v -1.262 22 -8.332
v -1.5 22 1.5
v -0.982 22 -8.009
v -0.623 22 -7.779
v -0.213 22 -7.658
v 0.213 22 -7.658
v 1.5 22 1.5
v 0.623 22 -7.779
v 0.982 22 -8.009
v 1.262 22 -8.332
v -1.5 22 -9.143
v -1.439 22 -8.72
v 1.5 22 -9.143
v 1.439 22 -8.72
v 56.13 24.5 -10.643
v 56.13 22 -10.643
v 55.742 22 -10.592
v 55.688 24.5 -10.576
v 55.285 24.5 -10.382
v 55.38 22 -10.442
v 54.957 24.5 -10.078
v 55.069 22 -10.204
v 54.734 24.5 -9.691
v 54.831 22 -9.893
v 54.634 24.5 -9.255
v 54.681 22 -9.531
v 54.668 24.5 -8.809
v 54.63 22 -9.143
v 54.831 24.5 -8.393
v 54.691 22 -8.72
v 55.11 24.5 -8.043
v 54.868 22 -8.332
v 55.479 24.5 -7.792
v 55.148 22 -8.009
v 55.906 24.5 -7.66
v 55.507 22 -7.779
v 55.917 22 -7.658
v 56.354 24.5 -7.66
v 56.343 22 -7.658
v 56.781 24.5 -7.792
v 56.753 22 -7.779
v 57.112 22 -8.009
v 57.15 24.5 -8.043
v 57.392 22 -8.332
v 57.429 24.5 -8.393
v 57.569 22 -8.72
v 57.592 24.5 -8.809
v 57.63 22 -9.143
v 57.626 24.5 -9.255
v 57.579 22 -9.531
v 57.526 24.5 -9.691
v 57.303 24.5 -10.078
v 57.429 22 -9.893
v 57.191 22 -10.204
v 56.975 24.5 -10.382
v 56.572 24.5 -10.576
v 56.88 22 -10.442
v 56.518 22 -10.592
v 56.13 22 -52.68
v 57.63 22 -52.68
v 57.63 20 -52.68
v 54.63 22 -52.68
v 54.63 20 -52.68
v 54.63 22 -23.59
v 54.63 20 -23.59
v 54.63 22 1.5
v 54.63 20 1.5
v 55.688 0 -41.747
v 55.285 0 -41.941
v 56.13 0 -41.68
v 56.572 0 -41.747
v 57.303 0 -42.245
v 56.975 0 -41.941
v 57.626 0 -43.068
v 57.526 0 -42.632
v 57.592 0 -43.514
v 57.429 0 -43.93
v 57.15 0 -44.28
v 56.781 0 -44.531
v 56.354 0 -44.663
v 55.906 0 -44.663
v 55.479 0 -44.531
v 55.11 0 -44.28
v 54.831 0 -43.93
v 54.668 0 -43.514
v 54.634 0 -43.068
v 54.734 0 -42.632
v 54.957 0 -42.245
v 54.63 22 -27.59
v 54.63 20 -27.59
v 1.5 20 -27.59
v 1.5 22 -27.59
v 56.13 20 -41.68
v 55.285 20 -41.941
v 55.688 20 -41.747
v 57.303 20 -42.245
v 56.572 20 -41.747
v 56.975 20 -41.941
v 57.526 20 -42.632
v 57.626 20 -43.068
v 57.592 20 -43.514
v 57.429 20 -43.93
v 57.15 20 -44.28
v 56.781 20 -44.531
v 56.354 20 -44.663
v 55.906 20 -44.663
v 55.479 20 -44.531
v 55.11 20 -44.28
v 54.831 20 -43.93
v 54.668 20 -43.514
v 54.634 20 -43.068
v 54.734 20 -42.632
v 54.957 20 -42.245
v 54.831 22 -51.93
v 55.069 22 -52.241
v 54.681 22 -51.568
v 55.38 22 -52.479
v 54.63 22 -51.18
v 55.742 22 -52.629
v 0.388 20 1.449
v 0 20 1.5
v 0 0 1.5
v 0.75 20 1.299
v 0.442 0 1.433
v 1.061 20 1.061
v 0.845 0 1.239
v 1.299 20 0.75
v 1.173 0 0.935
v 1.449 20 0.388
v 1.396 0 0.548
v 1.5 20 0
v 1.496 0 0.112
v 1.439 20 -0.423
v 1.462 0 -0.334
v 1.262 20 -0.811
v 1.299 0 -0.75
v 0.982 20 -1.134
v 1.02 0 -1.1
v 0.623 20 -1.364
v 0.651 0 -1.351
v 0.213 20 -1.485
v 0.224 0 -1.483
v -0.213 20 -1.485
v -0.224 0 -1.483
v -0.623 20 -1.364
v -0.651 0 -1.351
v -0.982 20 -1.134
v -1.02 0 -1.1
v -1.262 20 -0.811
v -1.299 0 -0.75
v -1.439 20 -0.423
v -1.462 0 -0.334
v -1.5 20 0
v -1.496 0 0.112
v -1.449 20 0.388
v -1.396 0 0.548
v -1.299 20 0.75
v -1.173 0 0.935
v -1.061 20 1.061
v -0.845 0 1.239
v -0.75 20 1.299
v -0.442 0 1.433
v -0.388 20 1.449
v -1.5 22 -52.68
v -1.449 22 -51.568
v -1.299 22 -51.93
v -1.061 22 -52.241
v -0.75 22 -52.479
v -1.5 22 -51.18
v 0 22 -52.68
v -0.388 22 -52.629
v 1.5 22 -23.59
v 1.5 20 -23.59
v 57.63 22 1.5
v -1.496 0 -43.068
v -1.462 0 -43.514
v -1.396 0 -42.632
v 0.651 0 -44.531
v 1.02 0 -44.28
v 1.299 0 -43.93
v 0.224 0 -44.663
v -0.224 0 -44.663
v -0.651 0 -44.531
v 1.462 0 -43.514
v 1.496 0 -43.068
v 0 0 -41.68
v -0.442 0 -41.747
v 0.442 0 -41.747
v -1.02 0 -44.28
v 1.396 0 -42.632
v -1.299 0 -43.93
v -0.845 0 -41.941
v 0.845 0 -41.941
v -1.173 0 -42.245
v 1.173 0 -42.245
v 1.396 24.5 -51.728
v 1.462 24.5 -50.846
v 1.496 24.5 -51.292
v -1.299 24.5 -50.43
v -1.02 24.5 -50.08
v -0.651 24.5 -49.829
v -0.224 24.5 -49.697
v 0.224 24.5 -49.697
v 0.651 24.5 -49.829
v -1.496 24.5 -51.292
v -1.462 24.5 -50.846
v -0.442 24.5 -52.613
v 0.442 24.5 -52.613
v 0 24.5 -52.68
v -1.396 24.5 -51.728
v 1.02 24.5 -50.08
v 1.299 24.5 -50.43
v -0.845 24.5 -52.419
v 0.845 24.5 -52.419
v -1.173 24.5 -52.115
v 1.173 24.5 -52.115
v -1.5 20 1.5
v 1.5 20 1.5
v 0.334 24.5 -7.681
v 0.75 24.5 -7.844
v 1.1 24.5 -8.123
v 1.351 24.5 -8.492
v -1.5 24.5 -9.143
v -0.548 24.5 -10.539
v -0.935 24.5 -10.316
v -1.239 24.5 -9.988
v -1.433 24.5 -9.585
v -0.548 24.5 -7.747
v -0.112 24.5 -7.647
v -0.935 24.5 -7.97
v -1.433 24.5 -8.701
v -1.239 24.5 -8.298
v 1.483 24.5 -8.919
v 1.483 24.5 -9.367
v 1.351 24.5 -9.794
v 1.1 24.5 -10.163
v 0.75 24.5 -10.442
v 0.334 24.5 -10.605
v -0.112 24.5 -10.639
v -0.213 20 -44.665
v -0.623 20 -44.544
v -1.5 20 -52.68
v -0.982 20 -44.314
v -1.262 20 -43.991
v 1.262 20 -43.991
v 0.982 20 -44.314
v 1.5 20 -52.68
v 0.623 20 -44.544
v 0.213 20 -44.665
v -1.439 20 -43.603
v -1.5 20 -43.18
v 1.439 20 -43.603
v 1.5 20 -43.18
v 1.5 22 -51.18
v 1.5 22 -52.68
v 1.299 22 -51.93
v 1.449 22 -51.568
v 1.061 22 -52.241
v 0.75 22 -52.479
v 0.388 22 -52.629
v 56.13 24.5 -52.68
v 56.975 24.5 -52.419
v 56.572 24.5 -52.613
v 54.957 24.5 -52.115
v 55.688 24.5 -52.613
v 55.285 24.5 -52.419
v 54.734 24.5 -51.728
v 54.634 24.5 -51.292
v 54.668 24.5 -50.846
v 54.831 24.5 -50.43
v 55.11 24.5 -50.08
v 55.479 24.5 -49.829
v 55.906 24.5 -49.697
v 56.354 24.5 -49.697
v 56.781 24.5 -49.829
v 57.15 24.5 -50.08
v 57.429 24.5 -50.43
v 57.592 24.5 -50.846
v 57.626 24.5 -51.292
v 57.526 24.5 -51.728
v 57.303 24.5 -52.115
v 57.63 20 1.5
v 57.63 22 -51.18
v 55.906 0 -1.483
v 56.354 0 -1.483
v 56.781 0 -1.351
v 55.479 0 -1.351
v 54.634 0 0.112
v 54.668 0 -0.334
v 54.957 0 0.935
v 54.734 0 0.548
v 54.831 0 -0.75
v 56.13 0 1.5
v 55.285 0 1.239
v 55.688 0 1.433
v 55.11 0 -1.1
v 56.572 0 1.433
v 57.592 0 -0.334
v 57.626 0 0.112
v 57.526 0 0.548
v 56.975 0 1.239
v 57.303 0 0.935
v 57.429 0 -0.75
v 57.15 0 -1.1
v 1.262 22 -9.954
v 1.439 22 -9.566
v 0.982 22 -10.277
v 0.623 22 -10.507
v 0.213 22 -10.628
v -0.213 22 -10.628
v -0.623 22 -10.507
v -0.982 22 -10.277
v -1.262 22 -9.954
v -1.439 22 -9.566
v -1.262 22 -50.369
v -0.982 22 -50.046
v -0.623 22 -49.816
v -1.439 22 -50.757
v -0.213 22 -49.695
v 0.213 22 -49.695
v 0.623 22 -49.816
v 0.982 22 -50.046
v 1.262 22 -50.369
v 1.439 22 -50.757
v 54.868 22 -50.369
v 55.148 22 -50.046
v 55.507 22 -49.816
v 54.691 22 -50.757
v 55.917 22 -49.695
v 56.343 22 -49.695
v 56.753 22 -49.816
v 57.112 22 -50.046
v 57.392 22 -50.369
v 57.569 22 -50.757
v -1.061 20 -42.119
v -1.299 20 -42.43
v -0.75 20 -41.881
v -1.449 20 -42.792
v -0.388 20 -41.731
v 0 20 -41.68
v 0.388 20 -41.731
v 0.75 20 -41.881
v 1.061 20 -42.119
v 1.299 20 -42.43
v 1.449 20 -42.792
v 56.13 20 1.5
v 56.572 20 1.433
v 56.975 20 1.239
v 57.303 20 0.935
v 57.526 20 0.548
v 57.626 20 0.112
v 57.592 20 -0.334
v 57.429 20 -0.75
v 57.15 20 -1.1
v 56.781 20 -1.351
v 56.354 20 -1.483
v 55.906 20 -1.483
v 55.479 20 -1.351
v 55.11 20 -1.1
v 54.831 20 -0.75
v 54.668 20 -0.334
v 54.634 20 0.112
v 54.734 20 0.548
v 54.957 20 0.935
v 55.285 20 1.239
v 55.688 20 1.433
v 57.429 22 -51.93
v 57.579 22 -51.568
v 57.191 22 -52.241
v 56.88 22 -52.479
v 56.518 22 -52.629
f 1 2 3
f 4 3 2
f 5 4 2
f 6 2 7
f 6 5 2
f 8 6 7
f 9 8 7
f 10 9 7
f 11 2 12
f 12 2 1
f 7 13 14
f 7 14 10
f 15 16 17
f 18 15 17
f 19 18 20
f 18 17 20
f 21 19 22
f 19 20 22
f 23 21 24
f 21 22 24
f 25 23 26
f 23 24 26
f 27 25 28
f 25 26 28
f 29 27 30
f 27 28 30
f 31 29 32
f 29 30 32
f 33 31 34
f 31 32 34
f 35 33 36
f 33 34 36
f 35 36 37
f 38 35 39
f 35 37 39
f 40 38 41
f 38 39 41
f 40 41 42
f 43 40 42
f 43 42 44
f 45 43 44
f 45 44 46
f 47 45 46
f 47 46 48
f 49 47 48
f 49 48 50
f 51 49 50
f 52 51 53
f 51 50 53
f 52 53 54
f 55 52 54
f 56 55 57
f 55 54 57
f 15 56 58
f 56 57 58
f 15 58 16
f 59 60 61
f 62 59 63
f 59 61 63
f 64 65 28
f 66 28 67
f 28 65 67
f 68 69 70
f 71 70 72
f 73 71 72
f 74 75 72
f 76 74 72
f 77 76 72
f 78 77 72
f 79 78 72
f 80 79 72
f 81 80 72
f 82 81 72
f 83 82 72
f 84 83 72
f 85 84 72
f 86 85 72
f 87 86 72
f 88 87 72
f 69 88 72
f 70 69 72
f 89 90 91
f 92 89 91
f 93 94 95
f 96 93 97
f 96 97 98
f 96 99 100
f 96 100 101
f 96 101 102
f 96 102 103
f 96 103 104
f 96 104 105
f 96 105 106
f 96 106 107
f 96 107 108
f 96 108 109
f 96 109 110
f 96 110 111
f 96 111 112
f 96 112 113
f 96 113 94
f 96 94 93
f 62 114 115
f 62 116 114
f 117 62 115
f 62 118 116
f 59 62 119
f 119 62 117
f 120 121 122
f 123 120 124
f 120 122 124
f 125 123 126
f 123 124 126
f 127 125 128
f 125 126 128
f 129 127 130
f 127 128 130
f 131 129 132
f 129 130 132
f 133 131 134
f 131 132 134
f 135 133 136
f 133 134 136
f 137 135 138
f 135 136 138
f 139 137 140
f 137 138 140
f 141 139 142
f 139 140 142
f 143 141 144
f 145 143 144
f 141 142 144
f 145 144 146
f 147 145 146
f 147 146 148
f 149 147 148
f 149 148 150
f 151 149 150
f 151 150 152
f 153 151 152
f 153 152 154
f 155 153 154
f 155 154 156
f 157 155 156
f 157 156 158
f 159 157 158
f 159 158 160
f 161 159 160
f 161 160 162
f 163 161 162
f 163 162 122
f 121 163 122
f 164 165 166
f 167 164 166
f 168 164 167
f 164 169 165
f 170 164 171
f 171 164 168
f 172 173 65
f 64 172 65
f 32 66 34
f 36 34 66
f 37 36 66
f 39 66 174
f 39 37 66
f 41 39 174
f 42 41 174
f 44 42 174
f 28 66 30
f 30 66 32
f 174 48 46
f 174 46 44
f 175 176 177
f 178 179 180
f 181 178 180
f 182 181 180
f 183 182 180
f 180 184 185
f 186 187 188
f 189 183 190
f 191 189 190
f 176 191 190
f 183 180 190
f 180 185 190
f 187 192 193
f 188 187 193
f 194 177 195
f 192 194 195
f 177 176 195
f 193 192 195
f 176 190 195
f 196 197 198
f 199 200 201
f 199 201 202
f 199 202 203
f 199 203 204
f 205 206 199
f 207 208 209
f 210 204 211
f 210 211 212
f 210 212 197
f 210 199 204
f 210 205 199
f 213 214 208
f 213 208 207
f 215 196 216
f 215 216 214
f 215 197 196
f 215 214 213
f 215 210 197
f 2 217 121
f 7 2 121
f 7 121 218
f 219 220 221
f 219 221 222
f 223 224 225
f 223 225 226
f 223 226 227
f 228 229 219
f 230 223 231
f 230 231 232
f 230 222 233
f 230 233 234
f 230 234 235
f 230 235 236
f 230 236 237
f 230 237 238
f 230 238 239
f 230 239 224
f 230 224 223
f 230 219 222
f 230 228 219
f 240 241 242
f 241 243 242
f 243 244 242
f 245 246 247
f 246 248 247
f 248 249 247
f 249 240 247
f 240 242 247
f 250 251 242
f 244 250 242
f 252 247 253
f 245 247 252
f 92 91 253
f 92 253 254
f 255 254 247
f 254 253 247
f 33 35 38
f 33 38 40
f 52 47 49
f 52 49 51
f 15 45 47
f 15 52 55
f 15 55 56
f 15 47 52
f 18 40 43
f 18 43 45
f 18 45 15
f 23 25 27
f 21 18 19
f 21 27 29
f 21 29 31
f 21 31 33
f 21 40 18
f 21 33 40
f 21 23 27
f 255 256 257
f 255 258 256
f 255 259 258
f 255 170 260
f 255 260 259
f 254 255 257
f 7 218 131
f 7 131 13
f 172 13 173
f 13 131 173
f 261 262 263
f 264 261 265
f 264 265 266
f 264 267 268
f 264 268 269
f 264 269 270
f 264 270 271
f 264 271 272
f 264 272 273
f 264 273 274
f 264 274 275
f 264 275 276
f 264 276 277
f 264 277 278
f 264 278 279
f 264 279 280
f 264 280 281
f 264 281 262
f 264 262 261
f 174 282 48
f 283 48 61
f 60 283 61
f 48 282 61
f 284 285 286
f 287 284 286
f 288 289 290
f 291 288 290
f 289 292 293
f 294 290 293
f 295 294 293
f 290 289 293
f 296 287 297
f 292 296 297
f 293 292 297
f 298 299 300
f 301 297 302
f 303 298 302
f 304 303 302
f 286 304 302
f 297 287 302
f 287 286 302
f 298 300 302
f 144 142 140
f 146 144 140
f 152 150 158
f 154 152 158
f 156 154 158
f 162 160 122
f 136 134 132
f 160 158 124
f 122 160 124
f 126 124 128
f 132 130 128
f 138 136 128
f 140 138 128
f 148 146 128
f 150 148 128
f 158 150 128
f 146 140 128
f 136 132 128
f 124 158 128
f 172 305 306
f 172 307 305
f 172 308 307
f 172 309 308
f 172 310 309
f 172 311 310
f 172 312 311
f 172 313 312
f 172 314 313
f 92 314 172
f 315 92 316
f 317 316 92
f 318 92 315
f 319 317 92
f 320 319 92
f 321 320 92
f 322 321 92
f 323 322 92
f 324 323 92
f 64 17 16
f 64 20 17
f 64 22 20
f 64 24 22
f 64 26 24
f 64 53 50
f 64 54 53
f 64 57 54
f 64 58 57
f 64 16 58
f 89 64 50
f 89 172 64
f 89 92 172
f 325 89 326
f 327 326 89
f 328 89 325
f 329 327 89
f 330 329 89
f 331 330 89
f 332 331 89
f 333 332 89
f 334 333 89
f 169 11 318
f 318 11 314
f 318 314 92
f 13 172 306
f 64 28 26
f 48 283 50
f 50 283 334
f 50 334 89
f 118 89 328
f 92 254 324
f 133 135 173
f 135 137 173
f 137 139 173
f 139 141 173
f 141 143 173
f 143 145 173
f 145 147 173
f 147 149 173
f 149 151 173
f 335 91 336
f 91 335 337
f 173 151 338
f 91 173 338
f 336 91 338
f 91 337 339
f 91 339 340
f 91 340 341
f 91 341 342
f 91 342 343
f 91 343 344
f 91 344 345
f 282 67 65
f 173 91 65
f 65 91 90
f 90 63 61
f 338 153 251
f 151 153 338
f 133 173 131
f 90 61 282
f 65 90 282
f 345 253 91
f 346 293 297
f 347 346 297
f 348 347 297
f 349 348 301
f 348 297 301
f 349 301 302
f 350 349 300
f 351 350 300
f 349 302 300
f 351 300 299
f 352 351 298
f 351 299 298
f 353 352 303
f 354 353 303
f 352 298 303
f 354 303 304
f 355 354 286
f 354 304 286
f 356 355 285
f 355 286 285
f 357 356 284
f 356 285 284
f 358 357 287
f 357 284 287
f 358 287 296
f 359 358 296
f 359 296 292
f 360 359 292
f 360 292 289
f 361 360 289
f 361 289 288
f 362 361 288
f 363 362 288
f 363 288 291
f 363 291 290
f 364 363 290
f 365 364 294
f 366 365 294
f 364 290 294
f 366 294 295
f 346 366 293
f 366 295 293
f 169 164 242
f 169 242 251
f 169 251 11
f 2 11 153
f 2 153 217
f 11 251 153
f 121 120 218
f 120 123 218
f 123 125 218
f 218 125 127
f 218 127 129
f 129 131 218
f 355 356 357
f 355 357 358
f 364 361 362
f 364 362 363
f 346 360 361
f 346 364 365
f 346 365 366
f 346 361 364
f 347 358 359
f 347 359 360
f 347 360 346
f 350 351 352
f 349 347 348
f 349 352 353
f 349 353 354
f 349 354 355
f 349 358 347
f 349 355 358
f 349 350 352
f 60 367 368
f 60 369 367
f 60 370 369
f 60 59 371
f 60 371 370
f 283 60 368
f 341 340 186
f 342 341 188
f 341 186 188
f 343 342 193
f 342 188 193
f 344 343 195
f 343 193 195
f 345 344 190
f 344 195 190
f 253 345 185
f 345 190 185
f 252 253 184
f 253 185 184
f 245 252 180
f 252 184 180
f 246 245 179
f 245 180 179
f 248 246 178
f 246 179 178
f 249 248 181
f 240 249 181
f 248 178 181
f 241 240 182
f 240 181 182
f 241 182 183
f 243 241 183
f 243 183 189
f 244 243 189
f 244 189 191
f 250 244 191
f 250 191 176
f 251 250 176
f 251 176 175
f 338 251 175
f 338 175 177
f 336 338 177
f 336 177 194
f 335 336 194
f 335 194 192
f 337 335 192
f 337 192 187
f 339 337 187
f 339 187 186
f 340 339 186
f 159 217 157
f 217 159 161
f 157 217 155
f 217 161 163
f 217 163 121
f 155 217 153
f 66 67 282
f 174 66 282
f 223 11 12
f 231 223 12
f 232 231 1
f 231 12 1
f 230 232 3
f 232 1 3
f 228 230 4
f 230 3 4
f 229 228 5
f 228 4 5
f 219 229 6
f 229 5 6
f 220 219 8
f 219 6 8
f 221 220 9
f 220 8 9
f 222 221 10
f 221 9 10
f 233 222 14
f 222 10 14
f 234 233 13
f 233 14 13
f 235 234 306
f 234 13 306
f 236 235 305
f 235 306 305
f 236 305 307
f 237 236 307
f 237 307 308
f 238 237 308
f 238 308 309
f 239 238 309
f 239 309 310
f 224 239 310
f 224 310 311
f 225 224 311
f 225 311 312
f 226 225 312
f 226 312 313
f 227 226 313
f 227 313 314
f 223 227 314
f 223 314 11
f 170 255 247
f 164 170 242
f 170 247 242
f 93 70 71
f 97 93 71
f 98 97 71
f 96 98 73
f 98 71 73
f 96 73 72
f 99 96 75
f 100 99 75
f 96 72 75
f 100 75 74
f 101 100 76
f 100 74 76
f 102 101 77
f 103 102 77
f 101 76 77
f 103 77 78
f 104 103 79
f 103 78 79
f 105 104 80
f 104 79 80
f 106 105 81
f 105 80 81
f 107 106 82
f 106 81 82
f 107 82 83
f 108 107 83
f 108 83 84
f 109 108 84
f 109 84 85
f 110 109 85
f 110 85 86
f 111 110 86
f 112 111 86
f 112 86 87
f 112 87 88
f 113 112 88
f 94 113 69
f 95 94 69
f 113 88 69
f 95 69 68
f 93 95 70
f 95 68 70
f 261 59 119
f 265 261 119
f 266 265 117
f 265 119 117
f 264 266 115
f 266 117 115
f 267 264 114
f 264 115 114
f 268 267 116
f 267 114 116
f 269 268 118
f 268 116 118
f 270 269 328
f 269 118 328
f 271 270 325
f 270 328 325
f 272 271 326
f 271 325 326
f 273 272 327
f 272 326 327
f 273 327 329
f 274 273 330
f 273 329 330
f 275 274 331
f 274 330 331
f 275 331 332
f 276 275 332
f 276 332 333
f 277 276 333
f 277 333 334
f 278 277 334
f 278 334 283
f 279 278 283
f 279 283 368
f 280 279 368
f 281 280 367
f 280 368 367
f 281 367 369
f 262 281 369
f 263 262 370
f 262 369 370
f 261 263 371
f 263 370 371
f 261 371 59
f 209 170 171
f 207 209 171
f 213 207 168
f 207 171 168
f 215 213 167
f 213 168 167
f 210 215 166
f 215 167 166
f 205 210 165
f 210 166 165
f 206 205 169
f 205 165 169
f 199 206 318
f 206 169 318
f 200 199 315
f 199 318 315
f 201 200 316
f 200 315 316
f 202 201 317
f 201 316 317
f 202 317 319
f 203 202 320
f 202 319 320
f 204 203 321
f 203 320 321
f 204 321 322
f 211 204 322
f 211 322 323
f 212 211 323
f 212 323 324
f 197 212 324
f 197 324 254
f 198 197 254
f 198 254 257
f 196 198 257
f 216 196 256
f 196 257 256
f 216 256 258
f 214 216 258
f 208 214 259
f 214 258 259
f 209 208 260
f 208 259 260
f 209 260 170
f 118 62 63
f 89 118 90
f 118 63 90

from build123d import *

# Parameters (mm, degrees)
SKETCH_1_R        = 1.5
EXTRUDE_1_DEPTH   = 20
EXTRUDE_1_2_DEPTH = 20
EXTRUDE_1_3_DEPTH = 20
EXTRUDE_1_4_DEPTH = 20
EXTRUDE_2_DEPTH   = 2
SKETCH_4_R        = 1.5
EXTRUDE_3_DEPTH   = 2.5


with BuildPart() as part:
    # 草图1 → 凸台-拉伸1 (new body)
    with BuildSketch(Plane(origin=(0, 0, 0), x_dir=(1, 0, 0), z_dir=(0, 1, 0))):
        with Locations(Location((0, 0, 0), (0, 0, 270))):
            Circle(SKETCH_1_R)
    extrude(amount=EXTRUDE_1_DEPTH)



with BuildPart() as body_2:
    # 草图1 → Extrude 1 2 (new body)
    with BuildSketch(Plane(origin=(0, 0, 0), x_dir=(1, 0, 0), z_dir=(0, 1, 0))):
        with Locations(Location((0, 43.18, 0), (0, 0, 270))):
            Circle(SKETCH_1_R)
    extrude(amount=EXTRUDE_1_2_DEPTH)


with BuildPart() as body_3:
    # 草图1 → Extrude 1 3 (new body)
    with BuildSketch(Plane(origin=(0, 0, 0), x_dir=(1, 0, 0), z_dir=(0, 1, 0))):
        with Locations(Location((56.13, 43.18, 0), (0, 0, 270))):
            Circle(SKETCH_1_R)
    extrude(amount=EXTRUDE_1_3_DEPTH)


with BuildPart() as body_4:
    # 草图1 → Extrude 1 4 (new body)
    with BuildSketch(Plane(origin=(0, 0, 0), x_dir=(1, 0, 0), z_dir=(0, 1, 0))):
        with Locations(Location((56.13, 0, 0), (0, 0, 270))):
            Circle(SKETCH_1_R)
    extrude(amount=EXTRUDE_1_4_DEPTH)


with BuildPart() as part_1:
    add(part.part)

    add(body_2.part)  # 凸台-拉伸2 merges body 2
    # 草图2 → 凸台-拉伸2 (add)
    with BuildSketch(Plane(origin=(0, 20, 0), x_dir=(1, 0, 0), z_dir=(0, 1, 0))):
        Polygon((-1.5, 52.68), (-1.5, -1.5), (1.5, -1.5), (1.5, 23.59), (54.63, 23.59), (54.63, -1.5), (57.63, -1.5), (57.63, 52.68), (54.63, 52.68), (54.63, 27.59), (1.5, 27.59), (1.5, 52.68), align=None)
    extrude(amount=EXTRUDE_2_DEPTH)

    # 草图4 → 凸台-拉伸3 (add)
    with BuildSketch(Plane(origin=(0, 22, 0), x_dir=(1, 0, 0), z_dir=(0, 1, 0))):
        with Locations(Location((0, 51.18, 0), (0, 0, 90))):
            Circle(SKETCH_4_R)
        with Locations(Location((0, 9.143, 0), (0, 0, 180))):
            Circle(SKETCH_4_R)
        with Locations(Location((56.13, 9.143, 0), (0, 0, 90))):
            Circle(SKETCH_4_R)
        with Locations(Location((56.13, 51.18, 0), (0, 0, 90))):
            Circle(SKETCH_4_R)
    extrude(amount=EXTRUDE_3_DEPTH)


solid = Compound([body_3.part, body_4.part, part_1.part])
